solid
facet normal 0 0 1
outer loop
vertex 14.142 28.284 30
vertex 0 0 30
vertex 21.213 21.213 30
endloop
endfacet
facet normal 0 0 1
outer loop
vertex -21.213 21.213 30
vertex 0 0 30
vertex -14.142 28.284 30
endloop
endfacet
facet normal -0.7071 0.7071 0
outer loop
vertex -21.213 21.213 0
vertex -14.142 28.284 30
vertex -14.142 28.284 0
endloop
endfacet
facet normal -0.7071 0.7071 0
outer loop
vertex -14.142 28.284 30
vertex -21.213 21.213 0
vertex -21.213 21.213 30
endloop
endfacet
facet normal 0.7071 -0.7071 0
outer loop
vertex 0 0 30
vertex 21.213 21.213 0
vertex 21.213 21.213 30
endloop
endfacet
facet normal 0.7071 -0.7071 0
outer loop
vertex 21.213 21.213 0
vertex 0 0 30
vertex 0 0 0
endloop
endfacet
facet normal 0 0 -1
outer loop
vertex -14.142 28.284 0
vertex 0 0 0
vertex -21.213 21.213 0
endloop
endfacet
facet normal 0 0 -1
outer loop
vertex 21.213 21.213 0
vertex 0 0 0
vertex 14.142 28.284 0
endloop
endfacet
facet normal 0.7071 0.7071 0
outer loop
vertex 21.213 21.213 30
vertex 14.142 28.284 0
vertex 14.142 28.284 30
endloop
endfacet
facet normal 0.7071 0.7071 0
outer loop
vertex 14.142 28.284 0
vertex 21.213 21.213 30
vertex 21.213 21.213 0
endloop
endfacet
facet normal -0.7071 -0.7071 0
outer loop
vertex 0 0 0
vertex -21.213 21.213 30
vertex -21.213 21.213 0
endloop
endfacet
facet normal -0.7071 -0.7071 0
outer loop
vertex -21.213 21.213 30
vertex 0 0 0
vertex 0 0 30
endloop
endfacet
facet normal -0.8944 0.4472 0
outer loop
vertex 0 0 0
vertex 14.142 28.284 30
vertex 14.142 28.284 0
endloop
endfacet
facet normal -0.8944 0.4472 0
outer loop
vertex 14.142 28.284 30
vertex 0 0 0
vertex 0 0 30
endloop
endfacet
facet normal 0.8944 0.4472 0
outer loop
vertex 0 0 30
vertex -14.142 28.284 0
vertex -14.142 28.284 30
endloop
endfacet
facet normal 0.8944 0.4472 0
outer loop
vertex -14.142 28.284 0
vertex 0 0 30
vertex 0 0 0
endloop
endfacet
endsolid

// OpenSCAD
rotate([0,-90,0]){
    difference(){
        rotate([-45,0,0]) {
            cube([30, 30, 30]);
        }
        scale([1,2,1]) {
            rotate([-45,0,0]) {
                cube([30, 30, 30]);
            }
        }
    }
}
